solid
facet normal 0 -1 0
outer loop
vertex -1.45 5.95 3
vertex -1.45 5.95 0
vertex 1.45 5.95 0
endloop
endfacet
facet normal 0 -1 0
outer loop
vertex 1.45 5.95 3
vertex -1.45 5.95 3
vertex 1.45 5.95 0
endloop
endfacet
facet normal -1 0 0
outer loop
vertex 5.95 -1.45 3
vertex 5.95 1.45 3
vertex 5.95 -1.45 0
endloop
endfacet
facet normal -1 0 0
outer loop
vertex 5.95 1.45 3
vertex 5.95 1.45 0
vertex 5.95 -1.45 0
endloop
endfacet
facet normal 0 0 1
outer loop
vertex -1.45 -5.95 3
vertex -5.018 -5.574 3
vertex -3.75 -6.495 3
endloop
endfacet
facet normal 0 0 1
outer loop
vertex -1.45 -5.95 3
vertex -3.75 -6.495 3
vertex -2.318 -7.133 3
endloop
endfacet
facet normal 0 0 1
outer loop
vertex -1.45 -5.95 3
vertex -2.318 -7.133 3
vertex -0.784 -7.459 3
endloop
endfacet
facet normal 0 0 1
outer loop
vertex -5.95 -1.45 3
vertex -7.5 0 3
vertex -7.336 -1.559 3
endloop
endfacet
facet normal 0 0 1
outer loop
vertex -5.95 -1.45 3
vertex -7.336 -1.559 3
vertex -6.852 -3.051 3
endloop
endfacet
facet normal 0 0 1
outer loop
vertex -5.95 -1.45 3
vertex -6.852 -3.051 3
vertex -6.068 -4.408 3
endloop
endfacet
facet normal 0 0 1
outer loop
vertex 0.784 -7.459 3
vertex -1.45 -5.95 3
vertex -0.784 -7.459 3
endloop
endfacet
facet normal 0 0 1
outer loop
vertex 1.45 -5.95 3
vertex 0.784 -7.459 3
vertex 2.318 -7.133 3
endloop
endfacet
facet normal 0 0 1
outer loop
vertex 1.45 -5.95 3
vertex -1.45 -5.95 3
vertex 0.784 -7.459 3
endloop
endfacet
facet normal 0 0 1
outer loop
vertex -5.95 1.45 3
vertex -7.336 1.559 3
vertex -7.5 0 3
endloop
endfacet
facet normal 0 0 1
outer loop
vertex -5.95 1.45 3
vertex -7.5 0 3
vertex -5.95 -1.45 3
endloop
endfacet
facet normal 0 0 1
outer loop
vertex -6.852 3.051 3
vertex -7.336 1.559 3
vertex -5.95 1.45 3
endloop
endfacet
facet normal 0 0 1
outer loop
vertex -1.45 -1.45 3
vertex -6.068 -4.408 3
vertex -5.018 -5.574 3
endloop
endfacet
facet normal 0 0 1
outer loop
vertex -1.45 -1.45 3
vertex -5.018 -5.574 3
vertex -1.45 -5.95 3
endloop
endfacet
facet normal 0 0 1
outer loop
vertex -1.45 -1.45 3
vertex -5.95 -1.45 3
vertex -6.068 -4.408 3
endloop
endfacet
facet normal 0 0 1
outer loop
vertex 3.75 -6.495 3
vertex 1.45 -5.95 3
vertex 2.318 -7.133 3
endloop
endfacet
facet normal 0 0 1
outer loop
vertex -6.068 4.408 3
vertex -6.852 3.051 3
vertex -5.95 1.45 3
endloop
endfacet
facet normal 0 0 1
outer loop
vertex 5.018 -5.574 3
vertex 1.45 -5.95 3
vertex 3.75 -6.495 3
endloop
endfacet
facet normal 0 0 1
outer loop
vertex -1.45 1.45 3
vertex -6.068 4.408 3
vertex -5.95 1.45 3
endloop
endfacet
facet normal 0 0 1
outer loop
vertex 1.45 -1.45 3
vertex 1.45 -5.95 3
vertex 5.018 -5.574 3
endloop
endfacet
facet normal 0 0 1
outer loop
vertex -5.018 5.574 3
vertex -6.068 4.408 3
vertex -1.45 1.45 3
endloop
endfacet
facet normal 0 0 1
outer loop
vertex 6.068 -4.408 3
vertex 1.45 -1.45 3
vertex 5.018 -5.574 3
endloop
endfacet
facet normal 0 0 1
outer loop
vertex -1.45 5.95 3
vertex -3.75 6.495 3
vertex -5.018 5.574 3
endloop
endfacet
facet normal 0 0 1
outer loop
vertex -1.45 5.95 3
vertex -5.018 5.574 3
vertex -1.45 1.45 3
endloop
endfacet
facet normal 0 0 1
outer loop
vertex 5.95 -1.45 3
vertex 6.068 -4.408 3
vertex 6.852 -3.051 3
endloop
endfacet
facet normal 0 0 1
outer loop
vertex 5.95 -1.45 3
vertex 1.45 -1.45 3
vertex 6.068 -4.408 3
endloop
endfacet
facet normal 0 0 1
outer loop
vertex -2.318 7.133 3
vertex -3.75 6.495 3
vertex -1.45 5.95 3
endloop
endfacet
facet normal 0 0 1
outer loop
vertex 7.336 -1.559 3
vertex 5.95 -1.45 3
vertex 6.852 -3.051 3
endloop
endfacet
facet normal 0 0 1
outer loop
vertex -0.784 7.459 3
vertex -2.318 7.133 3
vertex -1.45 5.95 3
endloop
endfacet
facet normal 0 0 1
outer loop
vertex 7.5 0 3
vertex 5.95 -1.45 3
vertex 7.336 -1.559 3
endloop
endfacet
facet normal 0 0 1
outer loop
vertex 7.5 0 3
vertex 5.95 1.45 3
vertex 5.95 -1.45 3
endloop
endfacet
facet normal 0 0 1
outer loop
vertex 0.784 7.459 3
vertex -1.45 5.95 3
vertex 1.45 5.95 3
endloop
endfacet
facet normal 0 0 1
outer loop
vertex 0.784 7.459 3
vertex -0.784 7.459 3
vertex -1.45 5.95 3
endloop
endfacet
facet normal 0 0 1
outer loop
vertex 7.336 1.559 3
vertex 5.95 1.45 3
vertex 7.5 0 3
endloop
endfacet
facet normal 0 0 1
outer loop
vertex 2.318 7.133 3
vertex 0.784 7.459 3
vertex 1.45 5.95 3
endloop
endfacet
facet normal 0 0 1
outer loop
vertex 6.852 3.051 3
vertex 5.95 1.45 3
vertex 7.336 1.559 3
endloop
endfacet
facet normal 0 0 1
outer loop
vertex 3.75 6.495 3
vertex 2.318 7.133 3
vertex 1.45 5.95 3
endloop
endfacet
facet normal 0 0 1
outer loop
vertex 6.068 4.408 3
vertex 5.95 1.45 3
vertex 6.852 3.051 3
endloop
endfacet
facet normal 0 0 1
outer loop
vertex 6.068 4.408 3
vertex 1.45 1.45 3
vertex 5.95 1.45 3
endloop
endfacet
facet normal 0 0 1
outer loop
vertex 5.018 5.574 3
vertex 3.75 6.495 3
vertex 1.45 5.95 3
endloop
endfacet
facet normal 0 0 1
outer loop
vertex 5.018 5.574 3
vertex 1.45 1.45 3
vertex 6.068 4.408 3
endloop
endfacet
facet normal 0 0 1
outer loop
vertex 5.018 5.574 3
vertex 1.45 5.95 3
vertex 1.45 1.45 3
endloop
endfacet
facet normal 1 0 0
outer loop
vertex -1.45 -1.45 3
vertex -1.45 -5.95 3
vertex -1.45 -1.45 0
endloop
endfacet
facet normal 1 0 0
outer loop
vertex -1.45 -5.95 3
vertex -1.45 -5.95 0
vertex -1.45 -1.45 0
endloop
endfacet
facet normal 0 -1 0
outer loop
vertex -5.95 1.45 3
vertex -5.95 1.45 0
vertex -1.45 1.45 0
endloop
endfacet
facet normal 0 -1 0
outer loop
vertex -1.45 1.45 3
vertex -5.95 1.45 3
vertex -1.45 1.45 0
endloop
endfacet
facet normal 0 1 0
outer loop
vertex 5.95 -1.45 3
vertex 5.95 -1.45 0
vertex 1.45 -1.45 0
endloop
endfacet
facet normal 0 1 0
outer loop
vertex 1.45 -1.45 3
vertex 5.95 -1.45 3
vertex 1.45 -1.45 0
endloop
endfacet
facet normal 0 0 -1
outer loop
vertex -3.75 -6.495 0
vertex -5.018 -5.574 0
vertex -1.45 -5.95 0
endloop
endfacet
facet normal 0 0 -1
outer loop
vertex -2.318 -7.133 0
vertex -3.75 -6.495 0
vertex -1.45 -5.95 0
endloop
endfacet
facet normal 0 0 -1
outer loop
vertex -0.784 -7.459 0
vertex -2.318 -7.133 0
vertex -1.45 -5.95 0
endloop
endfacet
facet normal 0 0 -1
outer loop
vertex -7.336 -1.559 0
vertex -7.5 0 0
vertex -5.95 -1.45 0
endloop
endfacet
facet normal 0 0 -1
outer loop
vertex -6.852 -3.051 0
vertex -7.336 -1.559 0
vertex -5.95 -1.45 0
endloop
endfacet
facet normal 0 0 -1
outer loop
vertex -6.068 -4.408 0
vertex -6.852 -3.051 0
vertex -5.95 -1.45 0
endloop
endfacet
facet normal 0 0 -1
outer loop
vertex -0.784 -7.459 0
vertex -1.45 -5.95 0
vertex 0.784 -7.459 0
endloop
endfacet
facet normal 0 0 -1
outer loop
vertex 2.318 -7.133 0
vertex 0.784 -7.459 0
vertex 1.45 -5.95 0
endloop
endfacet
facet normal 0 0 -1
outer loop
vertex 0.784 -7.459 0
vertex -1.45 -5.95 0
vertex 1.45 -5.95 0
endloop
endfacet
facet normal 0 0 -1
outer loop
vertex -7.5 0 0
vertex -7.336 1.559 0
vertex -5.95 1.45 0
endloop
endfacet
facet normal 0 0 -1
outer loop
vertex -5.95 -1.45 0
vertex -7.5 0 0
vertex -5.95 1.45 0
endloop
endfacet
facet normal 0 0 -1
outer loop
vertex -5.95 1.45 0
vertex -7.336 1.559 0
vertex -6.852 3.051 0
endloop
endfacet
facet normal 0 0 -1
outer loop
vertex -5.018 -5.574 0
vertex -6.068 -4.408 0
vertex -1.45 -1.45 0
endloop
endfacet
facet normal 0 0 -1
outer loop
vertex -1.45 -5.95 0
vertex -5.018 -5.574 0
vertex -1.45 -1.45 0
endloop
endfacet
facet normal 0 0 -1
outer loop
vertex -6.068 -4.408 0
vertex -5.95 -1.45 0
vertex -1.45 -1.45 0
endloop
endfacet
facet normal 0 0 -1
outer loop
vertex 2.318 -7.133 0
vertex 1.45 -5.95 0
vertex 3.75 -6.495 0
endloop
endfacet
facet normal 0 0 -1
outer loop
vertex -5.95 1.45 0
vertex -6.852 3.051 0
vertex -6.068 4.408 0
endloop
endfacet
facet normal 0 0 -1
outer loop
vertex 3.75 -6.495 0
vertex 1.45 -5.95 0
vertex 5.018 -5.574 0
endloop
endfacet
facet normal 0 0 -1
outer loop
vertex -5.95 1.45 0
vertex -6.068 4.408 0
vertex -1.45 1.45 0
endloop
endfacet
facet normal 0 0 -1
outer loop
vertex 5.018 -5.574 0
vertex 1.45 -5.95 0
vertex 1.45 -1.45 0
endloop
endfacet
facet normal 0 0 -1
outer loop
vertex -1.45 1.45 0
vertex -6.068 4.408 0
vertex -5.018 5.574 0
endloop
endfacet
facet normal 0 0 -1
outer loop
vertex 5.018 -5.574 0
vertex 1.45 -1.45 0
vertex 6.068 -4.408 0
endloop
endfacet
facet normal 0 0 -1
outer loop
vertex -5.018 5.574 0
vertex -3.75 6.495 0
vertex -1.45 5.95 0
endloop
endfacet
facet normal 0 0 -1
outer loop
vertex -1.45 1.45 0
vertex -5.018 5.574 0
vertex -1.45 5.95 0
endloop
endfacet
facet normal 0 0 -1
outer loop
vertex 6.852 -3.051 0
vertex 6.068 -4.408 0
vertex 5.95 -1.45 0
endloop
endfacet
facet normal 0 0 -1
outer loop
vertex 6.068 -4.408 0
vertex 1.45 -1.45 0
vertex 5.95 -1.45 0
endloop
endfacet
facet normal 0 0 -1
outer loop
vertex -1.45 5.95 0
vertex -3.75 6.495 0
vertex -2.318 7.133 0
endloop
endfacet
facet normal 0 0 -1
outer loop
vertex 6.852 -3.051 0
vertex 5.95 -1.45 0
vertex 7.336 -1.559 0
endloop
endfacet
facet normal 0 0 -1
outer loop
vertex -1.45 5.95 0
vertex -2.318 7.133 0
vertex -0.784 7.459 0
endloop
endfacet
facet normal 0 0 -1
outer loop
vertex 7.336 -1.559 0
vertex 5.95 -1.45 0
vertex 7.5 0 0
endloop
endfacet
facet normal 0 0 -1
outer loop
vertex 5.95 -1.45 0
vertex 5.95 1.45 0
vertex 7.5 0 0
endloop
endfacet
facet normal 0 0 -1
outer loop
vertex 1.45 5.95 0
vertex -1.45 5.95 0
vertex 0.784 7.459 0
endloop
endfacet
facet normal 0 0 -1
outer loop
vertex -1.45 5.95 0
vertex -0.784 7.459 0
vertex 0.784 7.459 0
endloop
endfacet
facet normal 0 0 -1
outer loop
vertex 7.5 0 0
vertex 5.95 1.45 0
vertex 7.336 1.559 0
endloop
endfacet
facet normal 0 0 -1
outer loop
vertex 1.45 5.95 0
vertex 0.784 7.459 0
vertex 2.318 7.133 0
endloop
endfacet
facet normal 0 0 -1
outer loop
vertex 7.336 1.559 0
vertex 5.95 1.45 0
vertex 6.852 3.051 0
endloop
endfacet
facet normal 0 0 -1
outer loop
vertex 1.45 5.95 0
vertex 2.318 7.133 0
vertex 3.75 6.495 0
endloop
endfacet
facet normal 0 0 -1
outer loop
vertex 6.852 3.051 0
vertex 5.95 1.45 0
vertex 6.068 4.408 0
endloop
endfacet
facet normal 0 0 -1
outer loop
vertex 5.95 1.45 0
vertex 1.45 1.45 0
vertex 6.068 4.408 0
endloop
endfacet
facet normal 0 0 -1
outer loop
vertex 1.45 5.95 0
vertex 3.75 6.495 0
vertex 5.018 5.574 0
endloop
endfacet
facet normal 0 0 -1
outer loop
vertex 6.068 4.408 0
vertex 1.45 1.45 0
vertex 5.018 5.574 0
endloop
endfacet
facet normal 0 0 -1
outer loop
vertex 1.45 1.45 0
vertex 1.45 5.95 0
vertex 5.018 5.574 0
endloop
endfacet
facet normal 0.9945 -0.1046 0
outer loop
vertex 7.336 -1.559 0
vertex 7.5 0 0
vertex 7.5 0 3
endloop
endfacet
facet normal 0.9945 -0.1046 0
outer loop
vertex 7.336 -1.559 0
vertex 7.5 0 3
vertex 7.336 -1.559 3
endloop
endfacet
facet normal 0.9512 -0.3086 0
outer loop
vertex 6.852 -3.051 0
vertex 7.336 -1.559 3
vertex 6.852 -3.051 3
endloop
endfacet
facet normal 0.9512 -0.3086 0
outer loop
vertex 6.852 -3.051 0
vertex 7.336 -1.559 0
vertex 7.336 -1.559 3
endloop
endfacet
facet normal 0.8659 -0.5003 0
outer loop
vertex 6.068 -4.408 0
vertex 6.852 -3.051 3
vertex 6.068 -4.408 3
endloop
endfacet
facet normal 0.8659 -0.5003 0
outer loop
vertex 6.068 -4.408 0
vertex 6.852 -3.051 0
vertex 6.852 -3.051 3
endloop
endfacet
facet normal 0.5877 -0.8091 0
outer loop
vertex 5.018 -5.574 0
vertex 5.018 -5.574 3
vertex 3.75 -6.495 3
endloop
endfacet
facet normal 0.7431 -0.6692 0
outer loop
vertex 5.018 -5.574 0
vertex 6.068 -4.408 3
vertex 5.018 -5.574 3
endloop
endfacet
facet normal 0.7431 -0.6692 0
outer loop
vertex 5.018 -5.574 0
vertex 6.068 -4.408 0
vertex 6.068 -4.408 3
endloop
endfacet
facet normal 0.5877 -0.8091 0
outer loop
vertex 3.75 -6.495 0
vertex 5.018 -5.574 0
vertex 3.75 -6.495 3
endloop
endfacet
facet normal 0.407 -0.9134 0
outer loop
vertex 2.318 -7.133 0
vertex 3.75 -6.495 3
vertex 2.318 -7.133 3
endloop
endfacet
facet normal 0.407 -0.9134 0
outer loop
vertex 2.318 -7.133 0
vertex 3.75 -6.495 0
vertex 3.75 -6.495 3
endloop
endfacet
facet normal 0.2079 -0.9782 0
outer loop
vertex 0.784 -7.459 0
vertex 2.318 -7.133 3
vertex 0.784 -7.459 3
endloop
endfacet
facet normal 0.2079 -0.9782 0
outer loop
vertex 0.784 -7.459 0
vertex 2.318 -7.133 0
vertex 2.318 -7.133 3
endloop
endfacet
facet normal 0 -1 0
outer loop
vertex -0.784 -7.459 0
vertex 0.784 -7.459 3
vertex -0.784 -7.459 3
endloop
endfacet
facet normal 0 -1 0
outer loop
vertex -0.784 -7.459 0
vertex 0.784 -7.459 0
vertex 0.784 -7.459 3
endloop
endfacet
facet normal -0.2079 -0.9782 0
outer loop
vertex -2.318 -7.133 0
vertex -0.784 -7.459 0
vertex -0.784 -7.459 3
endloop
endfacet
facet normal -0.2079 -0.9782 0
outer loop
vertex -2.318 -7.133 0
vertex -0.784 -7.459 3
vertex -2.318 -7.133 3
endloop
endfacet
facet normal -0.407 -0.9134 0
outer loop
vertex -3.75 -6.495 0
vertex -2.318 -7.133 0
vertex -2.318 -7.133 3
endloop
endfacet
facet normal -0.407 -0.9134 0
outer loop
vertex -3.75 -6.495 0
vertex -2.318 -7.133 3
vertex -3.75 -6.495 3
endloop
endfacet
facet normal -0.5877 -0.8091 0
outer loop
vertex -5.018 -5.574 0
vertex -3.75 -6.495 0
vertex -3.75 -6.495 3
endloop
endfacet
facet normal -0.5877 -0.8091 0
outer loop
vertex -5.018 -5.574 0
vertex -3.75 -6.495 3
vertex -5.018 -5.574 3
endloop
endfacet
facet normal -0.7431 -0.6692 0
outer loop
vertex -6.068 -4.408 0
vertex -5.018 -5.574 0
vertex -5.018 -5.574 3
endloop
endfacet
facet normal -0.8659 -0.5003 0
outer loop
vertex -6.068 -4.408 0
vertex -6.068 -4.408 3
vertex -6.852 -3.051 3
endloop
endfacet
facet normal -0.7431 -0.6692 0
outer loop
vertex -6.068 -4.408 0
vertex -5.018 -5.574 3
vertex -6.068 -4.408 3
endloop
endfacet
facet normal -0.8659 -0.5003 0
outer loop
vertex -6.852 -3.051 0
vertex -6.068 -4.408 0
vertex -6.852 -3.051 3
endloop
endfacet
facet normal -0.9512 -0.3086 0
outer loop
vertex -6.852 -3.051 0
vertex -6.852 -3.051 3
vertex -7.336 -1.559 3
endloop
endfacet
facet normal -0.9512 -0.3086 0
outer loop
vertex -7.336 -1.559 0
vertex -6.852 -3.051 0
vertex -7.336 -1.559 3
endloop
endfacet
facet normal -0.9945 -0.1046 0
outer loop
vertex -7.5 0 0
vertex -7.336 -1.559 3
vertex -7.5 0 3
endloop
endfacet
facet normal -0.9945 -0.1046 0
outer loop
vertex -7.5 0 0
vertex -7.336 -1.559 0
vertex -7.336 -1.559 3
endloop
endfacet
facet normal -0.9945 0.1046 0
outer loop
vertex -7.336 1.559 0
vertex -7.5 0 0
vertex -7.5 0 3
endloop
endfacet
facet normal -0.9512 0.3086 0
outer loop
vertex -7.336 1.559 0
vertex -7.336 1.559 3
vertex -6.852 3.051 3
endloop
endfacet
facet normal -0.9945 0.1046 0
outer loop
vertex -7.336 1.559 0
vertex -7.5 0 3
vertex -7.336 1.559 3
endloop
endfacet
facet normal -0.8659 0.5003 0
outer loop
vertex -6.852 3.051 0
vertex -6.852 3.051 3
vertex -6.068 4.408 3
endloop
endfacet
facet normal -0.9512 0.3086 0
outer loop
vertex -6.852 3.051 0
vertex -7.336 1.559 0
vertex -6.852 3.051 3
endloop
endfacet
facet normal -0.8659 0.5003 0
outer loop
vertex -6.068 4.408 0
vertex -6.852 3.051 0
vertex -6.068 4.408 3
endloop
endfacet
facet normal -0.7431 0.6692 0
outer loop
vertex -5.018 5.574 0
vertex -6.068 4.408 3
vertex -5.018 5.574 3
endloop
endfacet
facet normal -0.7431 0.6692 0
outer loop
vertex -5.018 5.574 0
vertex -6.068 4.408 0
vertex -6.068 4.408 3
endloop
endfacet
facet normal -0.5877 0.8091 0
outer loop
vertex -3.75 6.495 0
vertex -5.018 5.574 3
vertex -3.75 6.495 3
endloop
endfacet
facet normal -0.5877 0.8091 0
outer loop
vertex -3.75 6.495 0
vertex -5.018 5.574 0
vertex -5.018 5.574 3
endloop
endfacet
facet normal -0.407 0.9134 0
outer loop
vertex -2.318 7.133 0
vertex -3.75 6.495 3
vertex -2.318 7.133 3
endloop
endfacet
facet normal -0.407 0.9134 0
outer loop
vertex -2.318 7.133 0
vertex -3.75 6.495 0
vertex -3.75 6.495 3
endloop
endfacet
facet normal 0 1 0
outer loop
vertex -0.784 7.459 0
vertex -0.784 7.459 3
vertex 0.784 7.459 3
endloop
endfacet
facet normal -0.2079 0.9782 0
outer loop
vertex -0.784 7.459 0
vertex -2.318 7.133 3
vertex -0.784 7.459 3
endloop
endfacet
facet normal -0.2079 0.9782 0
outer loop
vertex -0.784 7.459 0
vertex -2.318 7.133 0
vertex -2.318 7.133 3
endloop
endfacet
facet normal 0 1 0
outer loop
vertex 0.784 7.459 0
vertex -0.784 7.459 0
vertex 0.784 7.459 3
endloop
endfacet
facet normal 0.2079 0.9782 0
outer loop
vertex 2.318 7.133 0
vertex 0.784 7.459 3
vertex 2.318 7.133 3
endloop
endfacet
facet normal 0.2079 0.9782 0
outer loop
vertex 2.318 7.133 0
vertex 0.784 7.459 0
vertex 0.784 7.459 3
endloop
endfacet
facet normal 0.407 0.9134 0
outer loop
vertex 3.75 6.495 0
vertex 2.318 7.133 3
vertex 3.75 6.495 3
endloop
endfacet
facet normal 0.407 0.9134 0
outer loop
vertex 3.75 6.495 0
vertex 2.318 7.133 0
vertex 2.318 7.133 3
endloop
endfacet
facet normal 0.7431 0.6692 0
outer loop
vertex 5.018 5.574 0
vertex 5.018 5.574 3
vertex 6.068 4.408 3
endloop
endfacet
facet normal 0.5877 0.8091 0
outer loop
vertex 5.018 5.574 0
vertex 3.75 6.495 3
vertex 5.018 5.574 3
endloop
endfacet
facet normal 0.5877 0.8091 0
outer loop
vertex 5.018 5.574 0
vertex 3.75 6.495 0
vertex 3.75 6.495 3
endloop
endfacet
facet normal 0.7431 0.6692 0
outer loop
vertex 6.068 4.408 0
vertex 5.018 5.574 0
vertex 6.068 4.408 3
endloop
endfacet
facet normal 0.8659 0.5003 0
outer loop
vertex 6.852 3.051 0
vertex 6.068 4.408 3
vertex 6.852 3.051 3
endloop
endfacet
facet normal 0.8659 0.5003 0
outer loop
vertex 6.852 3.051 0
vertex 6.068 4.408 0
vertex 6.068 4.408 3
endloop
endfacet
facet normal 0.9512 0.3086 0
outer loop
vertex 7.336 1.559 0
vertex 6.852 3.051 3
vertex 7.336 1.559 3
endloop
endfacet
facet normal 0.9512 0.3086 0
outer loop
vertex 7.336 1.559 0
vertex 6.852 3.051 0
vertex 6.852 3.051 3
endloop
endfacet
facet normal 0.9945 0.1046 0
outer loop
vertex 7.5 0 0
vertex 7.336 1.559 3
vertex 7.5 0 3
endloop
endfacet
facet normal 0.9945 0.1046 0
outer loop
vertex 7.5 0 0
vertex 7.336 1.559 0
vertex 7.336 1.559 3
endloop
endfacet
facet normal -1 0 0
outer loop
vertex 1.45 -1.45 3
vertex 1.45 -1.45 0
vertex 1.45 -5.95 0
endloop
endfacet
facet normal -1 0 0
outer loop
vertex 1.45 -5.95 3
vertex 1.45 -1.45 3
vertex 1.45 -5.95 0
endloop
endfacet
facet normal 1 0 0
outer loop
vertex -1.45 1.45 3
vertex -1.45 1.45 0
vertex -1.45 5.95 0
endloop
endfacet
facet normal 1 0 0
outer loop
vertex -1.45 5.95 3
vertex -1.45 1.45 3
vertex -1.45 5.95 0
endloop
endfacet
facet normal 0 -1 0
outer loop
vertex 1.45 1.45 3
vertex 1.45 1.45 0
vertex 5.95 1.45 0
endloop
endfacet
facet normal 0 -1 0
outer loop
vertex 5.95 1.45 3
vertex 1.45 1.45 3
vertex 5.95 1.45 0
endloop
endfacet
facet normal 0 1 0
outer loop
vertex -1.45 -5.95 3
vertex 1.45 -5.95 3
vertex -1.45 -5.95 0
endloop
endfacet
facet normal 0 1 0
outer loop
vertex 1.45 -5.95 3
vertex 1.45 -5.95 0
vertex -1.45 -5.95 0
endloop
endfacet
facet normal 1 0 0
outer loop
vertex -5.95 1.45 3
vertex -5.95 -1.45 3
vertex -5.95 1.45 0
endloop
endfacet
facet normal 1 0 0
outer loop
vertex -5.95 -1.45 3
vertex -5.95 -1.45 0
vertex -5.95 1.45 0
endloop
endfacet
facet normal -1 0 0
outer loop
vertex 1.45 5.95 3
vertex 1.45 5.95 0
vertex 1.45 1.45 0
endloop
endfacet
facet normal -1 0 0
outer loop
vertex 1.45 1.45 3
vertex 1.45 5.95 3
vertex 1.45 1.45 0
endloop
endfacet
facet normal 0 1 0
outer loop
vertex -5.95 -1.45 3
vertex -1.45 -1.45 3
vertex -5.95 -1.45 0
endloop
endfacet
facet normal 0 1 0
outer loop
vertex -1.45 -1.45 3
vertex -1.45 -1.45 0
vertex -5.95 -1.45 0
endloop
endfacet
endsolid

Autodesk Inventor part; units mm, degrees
ref_plane "YZ Plane" through (0, 0, 0) normal (1, 0, 0) x (0, 1, 0)
ref_plane "XZ Plane" through (0, 0, 0) normal (0, 1, 0) x (-1, 0, 0)
ref_plane "XY Plane" through (0, 0, 0) normal (0, 0, 1) x (1, 0, 0)
sketch "草圖1" plane through (0, 0, 0) normal (0, 0, 1) x (1, 0, 0)
  circle A0 centre (0, 0) radius 7.5
  line L0 (5.95, -1.45) -> (-5.95, -1.45)
  line L1 (-5.95, -1.45) -> (-5.95, 1.45)
  line L2 (-5.95, 1.45) -> (5.95, 1.45)
  line L3 (5.95, 1.45) -> (5.95, -1.45)
  line L4 (5.95, -1.45) -> (-5.95, 1.45) construction
  line L5 (-5.95, -1.45) -> (5.95, 1.45) construction
  line L6 (1.45, -5.95) -> (-1.45, -5.95)
  line L7 (-1.45, -5.95) -> (-1.45, 5.95)
  line L8 (-1.45, 5.95) -> (1.45, 5.95)
  line L9 (1.45, 5.95) -> (1.45, -5.95)
  line L10 (1.45, -5.95) -> (-1.45, 5.95) construction
  line L11 (-1.45, -5.95) -> (1.45, 5.95) construction
  point P0 (-1.45, 1.45)
  point P1 (1.45, 1.45)
  point P2 (1.45, -1.45)
  point P3 (-1.45, -1.45)
  dimension "d0" = 15
  dimension "d1" = 11.9
  dimension "d2" = 2.9
extrude "擠出1" add sketch "草圖1" along normal blind 3
properties part number "rod_7"
